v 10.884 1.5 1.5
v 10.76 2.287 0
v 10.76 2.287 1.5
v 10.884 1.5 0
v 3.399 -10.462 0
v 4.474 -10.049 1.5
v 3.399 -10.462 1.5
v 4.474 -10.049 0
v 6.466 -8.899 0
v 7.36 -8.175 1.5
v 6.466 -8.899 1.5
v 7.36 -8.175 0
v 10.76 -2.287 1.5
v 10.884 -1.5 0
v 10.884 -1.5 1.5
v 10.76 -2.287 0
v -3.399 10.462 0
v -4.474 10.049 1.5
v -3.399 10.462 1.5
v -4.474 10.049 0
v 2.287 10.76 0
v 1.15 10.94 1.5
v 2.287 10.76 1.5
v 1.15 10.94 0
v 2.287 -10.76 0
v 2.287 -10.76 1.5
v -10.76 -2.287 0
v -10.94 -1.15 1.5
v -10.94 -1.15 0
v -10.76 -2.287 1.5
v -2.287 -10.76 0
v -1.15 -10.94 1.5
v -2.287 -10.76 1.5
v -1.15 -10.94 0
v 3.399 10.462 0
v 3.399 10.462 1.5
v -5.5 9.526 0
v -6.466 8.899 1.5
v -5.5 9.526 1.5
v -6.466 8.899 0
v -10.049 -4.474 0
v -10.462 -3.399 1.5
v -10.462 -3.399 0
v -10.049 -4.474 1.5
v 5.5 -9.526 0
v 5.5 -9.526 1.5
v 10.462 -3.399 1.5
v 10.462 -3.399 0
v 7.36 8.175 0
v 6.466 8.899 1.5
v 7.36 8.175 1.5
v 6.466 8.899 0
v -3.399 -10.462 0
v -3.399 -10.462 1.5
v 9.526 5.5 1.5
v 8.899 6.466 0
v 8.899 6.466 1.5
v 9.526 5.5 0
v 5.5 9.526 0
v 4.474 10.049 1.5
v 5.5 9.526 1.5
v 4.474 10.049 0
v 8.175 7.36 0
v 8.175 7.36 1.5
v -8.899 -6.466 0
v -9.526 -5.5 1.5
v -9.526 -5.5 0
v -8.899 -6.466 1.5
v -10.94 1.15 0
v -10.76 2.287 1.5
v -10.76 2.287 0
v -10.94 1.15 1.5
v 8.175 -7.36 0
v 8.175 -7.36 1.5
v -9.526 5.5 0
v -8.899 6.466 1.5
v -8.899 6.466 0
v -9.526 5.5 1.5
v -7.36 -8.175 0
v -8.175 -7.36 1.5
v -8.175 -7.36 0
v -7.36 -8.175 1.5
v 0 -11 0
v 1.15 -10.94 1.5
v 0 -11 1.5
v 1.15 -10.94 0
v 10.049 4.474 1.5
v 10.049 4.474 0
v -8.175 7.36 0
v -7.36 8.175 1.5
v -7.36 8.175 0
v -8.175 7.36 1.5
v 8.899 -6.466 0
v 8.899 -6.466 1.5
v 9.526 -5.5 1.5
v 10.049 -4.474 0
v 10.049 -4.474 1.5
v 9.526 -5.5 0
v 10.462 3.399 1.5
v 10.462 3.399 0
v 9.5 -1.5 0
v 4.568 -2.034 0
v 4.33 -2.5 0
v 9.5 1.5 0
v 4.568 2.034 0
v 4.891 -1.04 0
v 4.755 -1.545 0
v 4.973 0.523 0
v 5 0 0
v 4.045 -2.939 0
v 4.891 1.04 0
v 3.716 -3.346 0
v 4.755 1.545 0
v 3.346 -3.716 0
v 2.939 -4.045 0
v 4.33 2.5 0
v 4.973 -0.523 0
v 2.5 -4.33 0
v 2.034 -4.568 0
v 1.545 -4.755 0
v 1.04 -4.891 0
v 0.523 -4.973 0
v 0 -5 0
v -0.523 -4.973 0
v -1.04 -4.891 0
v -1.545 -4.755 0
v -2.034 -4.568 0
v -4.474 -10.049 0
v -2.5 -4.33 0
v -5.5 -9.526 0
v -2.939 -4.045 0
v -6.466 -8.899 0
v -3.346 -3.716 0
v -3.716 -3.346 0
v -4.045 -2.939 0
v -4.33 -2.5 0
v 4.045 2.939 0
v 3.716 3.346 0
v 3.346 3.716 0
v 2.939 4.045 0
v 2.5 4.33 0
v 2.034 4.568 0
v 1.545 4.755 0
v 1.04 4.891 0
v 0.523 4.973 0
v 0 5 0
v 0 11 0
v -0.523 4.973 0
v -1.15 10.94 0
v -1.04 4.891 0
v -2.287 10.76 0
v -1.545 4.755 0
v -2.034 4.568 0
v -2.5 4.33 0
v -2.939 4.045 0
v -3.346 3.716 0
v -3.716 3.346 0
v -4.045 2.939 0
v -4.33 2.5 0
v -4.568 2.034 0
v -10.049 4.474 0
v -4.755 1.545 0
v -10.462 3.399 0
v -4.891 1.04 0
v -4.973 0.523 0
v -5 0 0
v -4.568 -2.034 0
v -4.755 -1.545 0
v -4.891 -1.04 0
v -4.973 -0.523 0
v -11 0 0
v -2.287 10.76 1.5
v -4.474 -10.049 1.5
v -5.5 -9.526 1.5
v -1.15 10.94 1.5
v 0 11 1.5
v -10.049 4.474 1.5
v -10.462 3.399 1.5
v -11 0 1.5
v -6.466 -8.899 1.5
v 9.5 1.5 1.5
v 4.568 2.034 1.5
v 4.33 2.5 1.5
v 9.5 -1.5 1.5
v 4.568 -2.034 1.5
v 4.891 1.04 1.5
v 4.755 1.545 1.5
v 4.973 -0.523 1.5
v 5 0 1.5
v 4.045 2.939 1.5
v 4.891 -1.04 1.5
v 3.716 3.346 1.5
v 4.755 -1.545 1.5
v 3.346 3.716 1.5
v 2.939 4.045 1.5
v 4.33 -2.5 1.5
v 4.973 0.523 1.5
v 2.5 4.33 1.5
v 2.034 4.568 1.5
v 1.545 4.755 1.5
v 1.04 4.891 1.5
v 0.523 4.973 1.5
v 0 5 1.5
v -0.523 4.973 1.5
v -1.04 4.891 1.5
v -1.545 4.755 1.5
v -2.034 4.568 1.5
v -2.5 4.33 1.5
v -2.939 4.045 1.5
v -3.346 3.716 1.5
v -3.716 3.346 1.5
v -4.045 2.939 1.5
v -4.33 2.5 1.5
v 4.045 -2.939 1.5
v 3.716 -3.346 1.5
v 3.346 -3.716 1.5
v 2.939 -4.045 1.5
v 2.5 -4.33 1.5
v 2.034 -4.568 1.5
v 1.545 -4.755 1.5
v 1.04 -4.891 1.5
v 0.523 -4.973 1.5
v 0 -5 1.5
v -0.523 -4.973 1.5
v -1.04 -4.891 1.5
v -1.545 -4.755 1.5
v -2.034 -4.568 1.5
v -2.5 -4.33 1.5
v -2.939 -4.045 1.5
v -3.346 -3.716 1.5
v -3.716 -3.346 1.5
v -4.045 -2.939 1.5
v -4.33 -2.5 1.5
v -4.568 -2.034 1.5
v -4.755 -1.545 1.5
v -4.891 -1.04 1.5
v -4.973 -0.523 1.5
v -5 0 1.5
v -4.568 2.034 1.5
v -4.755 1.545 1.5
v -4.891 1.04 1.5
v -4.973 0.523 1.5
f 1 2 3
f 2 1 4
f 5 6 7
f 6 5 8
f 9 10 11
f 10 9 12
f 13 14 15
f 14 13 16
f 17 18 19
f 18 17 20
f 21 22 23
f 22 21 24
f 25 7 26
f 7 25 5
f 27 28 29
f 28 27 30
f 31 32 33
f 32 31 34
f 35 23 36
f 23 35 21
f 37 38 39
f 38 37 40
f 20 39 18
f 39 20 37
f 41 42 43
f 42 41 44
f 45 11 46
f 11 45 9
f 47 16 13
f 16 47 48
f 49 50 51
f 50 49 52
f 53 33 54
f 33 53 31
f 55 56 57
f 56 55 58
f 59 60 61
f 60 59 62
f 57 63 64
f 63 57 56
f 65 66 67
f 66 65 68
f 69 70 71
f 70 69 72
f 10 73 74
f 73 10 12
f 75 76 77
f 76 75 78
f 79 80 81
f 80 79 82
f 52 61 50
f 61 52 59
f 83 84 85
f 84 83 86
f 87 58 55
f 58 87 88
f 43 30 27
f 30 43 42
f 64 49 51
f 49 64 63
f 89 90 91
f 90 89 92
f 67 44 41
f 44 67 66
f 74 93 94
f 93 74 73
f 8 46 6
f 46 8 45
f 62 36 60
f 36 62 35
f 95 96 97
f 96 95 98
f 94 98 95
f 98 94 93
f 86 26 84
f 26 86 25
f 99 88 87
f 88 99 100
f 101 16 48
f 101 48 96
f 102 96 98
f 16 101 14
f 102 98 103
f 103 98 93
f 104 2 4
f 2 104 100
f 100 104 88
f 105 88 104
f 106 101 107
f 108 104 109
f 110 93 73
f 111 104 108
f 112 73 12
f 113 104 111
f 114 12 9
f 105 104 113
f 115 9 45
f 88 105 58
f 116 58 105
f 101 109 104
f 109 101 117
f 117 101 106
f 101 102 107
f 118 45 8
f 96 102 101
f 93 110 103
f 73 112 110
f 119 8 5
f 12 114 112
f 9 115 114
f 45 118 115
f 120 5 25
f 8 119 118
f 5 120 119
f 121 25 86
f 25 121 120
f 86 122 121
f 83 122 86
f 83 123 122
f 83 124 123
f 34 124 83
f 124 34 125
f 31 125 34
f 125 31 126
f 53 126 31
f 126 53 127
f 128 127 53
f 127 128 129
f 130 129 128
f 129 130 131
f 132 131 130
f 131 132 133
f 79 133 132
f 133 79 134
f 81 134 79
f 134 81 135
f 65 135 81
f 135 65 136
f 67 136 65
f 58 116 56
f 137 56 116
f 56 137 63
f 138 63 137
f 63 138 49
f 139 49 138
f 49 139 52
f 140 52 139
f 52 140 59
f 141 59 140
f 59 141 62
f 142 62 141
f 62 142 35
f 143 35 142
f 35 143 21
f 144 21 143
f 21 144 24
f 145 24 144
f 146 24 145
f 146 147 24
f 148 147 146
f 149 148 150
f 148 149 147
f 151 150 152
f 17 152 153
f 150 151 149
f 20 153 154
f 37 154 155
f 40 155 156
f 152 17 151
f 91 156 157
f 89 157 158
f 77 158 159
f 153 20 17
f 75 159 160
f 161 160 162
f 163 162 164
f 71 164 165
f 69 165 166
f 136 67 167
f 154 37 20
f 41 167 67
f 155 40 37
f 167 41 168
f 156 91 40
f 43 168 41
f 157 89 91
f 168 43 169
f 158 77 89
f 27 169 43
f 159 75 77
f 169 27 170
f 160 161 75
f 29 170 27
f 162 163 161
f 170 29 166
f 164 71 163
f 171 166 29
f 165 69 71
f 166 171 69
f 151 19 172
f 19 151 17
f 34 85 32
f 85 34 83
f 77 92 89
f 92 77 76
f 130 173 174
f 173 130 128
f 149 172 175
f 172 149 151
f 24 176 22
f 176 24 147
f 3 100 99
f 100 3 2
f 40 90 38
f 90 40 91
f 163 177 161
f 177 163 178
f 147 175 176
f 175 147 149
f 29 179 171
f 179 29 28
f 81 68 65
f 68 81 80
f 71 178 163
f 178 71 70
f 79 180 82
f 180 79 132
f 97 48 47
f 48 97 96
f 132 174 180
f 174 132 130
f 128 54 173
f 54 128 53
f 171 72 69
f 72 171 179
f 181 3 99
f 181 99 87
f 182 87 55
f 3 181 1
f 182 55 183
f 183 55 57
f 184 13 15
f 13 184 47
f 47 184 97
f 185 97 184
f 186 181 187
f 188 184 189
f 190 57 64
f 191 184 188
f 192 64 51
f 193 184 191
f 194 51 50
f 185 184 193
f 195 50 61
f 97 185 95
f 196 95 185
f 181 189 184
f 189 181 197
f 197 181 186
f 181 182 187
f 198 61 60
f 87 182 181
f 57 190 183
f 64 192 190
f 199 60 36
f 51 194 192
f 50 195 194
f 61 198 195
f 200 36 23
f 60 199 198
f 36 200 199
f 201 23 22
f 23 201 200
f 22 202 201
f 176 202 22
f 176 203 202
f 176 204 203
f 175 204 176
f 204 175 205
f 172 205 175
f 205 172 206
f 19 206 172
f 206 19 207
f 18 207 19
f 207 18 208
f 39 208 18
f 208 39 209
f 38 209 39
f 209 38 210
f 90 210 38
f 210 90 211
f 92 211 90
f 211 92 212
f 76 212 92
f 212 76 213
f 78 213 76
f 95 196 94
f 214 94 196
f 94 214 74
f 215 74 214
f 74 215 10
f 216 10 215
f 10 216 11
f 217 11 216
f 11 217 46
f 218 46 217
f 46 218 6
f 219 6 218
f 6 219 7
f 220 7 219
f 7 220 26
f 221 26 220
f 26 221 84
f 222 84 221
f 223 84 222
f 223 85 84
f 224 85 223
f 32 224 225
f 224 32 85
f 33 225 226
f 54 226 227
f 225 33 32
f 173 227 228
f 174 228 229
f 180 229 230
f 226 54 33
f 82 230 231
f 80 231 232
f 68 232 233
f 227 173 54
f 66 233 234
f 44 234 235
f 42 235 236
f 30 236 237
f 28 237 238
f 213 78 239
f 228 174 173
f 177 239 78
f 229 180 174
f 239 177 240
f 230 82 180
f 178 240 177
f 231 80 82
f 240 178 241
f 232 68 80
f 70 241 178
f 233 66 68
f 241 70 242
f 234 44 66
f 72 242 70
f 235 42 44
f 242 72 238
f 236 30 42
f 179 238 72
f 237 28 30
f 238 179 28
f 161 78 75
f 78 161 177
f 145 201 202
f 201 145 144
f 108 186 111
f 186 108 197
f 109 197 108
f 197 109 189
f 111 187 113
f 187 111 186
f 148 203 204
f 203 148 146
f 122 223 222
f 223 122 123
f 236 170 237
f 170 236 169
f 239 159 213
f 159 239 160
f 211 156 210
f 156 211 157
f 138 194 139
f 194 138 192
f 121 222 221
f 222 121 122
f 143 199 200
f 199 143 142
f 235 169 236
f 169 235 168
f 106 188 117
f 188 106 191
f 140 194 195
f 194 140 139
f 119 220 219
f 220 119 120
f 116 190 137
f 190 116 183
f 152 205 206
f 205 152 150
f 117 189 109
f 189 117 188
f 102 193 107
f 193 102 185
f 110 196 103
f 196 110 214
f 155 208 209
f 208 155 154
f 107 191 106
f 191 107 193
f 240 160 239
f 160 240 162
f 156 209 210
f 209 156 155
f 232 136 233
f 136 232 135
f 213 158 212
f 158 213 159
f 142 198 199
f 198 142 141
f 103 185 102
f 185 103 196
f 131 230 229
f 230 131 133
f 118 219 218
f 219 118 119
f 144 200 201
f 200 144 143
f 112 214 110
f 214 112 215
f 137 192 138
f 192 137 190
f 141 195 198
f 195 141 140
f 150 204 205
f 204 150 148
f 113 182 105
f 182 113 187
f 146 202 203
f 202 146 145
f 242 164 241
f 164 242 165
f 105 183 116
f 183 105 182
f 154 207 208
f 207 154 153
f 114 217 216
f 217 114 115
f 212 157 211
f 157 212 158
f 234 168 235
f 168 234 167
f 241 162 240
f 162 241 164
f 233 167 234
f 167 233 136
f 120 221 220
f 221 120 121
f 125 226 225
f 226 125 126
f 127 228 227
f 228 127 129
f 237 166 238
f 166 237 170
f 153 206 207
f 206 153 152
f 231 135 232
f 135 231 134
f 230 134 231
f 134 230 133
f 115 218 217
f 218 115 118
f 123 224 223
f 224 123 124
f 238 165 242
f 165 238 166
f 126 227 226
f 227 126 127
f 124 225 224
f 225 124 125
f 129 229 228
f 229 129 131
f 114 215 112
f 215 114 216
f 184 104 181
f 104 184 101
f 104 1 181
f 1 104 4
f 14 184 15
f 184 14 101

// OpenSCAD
// External retaining ring with installation gap.
$fn = 60;
eps = 0.02;
shaft_d = 10;
outer_d = 22;
thickness = 1.5;
gap = 3;
difference() {
    cylinder(d = outer_d, h = thickness);
    translate([0, 0, -eps]) cylinder(d = shaft_d, h = thickness + 2 * eps);
    translate([outer_d / 2 - gap / 2, -gap / 2, -eps]) cube([gap + eps, gap, thickness + 2 * eps]);
}
